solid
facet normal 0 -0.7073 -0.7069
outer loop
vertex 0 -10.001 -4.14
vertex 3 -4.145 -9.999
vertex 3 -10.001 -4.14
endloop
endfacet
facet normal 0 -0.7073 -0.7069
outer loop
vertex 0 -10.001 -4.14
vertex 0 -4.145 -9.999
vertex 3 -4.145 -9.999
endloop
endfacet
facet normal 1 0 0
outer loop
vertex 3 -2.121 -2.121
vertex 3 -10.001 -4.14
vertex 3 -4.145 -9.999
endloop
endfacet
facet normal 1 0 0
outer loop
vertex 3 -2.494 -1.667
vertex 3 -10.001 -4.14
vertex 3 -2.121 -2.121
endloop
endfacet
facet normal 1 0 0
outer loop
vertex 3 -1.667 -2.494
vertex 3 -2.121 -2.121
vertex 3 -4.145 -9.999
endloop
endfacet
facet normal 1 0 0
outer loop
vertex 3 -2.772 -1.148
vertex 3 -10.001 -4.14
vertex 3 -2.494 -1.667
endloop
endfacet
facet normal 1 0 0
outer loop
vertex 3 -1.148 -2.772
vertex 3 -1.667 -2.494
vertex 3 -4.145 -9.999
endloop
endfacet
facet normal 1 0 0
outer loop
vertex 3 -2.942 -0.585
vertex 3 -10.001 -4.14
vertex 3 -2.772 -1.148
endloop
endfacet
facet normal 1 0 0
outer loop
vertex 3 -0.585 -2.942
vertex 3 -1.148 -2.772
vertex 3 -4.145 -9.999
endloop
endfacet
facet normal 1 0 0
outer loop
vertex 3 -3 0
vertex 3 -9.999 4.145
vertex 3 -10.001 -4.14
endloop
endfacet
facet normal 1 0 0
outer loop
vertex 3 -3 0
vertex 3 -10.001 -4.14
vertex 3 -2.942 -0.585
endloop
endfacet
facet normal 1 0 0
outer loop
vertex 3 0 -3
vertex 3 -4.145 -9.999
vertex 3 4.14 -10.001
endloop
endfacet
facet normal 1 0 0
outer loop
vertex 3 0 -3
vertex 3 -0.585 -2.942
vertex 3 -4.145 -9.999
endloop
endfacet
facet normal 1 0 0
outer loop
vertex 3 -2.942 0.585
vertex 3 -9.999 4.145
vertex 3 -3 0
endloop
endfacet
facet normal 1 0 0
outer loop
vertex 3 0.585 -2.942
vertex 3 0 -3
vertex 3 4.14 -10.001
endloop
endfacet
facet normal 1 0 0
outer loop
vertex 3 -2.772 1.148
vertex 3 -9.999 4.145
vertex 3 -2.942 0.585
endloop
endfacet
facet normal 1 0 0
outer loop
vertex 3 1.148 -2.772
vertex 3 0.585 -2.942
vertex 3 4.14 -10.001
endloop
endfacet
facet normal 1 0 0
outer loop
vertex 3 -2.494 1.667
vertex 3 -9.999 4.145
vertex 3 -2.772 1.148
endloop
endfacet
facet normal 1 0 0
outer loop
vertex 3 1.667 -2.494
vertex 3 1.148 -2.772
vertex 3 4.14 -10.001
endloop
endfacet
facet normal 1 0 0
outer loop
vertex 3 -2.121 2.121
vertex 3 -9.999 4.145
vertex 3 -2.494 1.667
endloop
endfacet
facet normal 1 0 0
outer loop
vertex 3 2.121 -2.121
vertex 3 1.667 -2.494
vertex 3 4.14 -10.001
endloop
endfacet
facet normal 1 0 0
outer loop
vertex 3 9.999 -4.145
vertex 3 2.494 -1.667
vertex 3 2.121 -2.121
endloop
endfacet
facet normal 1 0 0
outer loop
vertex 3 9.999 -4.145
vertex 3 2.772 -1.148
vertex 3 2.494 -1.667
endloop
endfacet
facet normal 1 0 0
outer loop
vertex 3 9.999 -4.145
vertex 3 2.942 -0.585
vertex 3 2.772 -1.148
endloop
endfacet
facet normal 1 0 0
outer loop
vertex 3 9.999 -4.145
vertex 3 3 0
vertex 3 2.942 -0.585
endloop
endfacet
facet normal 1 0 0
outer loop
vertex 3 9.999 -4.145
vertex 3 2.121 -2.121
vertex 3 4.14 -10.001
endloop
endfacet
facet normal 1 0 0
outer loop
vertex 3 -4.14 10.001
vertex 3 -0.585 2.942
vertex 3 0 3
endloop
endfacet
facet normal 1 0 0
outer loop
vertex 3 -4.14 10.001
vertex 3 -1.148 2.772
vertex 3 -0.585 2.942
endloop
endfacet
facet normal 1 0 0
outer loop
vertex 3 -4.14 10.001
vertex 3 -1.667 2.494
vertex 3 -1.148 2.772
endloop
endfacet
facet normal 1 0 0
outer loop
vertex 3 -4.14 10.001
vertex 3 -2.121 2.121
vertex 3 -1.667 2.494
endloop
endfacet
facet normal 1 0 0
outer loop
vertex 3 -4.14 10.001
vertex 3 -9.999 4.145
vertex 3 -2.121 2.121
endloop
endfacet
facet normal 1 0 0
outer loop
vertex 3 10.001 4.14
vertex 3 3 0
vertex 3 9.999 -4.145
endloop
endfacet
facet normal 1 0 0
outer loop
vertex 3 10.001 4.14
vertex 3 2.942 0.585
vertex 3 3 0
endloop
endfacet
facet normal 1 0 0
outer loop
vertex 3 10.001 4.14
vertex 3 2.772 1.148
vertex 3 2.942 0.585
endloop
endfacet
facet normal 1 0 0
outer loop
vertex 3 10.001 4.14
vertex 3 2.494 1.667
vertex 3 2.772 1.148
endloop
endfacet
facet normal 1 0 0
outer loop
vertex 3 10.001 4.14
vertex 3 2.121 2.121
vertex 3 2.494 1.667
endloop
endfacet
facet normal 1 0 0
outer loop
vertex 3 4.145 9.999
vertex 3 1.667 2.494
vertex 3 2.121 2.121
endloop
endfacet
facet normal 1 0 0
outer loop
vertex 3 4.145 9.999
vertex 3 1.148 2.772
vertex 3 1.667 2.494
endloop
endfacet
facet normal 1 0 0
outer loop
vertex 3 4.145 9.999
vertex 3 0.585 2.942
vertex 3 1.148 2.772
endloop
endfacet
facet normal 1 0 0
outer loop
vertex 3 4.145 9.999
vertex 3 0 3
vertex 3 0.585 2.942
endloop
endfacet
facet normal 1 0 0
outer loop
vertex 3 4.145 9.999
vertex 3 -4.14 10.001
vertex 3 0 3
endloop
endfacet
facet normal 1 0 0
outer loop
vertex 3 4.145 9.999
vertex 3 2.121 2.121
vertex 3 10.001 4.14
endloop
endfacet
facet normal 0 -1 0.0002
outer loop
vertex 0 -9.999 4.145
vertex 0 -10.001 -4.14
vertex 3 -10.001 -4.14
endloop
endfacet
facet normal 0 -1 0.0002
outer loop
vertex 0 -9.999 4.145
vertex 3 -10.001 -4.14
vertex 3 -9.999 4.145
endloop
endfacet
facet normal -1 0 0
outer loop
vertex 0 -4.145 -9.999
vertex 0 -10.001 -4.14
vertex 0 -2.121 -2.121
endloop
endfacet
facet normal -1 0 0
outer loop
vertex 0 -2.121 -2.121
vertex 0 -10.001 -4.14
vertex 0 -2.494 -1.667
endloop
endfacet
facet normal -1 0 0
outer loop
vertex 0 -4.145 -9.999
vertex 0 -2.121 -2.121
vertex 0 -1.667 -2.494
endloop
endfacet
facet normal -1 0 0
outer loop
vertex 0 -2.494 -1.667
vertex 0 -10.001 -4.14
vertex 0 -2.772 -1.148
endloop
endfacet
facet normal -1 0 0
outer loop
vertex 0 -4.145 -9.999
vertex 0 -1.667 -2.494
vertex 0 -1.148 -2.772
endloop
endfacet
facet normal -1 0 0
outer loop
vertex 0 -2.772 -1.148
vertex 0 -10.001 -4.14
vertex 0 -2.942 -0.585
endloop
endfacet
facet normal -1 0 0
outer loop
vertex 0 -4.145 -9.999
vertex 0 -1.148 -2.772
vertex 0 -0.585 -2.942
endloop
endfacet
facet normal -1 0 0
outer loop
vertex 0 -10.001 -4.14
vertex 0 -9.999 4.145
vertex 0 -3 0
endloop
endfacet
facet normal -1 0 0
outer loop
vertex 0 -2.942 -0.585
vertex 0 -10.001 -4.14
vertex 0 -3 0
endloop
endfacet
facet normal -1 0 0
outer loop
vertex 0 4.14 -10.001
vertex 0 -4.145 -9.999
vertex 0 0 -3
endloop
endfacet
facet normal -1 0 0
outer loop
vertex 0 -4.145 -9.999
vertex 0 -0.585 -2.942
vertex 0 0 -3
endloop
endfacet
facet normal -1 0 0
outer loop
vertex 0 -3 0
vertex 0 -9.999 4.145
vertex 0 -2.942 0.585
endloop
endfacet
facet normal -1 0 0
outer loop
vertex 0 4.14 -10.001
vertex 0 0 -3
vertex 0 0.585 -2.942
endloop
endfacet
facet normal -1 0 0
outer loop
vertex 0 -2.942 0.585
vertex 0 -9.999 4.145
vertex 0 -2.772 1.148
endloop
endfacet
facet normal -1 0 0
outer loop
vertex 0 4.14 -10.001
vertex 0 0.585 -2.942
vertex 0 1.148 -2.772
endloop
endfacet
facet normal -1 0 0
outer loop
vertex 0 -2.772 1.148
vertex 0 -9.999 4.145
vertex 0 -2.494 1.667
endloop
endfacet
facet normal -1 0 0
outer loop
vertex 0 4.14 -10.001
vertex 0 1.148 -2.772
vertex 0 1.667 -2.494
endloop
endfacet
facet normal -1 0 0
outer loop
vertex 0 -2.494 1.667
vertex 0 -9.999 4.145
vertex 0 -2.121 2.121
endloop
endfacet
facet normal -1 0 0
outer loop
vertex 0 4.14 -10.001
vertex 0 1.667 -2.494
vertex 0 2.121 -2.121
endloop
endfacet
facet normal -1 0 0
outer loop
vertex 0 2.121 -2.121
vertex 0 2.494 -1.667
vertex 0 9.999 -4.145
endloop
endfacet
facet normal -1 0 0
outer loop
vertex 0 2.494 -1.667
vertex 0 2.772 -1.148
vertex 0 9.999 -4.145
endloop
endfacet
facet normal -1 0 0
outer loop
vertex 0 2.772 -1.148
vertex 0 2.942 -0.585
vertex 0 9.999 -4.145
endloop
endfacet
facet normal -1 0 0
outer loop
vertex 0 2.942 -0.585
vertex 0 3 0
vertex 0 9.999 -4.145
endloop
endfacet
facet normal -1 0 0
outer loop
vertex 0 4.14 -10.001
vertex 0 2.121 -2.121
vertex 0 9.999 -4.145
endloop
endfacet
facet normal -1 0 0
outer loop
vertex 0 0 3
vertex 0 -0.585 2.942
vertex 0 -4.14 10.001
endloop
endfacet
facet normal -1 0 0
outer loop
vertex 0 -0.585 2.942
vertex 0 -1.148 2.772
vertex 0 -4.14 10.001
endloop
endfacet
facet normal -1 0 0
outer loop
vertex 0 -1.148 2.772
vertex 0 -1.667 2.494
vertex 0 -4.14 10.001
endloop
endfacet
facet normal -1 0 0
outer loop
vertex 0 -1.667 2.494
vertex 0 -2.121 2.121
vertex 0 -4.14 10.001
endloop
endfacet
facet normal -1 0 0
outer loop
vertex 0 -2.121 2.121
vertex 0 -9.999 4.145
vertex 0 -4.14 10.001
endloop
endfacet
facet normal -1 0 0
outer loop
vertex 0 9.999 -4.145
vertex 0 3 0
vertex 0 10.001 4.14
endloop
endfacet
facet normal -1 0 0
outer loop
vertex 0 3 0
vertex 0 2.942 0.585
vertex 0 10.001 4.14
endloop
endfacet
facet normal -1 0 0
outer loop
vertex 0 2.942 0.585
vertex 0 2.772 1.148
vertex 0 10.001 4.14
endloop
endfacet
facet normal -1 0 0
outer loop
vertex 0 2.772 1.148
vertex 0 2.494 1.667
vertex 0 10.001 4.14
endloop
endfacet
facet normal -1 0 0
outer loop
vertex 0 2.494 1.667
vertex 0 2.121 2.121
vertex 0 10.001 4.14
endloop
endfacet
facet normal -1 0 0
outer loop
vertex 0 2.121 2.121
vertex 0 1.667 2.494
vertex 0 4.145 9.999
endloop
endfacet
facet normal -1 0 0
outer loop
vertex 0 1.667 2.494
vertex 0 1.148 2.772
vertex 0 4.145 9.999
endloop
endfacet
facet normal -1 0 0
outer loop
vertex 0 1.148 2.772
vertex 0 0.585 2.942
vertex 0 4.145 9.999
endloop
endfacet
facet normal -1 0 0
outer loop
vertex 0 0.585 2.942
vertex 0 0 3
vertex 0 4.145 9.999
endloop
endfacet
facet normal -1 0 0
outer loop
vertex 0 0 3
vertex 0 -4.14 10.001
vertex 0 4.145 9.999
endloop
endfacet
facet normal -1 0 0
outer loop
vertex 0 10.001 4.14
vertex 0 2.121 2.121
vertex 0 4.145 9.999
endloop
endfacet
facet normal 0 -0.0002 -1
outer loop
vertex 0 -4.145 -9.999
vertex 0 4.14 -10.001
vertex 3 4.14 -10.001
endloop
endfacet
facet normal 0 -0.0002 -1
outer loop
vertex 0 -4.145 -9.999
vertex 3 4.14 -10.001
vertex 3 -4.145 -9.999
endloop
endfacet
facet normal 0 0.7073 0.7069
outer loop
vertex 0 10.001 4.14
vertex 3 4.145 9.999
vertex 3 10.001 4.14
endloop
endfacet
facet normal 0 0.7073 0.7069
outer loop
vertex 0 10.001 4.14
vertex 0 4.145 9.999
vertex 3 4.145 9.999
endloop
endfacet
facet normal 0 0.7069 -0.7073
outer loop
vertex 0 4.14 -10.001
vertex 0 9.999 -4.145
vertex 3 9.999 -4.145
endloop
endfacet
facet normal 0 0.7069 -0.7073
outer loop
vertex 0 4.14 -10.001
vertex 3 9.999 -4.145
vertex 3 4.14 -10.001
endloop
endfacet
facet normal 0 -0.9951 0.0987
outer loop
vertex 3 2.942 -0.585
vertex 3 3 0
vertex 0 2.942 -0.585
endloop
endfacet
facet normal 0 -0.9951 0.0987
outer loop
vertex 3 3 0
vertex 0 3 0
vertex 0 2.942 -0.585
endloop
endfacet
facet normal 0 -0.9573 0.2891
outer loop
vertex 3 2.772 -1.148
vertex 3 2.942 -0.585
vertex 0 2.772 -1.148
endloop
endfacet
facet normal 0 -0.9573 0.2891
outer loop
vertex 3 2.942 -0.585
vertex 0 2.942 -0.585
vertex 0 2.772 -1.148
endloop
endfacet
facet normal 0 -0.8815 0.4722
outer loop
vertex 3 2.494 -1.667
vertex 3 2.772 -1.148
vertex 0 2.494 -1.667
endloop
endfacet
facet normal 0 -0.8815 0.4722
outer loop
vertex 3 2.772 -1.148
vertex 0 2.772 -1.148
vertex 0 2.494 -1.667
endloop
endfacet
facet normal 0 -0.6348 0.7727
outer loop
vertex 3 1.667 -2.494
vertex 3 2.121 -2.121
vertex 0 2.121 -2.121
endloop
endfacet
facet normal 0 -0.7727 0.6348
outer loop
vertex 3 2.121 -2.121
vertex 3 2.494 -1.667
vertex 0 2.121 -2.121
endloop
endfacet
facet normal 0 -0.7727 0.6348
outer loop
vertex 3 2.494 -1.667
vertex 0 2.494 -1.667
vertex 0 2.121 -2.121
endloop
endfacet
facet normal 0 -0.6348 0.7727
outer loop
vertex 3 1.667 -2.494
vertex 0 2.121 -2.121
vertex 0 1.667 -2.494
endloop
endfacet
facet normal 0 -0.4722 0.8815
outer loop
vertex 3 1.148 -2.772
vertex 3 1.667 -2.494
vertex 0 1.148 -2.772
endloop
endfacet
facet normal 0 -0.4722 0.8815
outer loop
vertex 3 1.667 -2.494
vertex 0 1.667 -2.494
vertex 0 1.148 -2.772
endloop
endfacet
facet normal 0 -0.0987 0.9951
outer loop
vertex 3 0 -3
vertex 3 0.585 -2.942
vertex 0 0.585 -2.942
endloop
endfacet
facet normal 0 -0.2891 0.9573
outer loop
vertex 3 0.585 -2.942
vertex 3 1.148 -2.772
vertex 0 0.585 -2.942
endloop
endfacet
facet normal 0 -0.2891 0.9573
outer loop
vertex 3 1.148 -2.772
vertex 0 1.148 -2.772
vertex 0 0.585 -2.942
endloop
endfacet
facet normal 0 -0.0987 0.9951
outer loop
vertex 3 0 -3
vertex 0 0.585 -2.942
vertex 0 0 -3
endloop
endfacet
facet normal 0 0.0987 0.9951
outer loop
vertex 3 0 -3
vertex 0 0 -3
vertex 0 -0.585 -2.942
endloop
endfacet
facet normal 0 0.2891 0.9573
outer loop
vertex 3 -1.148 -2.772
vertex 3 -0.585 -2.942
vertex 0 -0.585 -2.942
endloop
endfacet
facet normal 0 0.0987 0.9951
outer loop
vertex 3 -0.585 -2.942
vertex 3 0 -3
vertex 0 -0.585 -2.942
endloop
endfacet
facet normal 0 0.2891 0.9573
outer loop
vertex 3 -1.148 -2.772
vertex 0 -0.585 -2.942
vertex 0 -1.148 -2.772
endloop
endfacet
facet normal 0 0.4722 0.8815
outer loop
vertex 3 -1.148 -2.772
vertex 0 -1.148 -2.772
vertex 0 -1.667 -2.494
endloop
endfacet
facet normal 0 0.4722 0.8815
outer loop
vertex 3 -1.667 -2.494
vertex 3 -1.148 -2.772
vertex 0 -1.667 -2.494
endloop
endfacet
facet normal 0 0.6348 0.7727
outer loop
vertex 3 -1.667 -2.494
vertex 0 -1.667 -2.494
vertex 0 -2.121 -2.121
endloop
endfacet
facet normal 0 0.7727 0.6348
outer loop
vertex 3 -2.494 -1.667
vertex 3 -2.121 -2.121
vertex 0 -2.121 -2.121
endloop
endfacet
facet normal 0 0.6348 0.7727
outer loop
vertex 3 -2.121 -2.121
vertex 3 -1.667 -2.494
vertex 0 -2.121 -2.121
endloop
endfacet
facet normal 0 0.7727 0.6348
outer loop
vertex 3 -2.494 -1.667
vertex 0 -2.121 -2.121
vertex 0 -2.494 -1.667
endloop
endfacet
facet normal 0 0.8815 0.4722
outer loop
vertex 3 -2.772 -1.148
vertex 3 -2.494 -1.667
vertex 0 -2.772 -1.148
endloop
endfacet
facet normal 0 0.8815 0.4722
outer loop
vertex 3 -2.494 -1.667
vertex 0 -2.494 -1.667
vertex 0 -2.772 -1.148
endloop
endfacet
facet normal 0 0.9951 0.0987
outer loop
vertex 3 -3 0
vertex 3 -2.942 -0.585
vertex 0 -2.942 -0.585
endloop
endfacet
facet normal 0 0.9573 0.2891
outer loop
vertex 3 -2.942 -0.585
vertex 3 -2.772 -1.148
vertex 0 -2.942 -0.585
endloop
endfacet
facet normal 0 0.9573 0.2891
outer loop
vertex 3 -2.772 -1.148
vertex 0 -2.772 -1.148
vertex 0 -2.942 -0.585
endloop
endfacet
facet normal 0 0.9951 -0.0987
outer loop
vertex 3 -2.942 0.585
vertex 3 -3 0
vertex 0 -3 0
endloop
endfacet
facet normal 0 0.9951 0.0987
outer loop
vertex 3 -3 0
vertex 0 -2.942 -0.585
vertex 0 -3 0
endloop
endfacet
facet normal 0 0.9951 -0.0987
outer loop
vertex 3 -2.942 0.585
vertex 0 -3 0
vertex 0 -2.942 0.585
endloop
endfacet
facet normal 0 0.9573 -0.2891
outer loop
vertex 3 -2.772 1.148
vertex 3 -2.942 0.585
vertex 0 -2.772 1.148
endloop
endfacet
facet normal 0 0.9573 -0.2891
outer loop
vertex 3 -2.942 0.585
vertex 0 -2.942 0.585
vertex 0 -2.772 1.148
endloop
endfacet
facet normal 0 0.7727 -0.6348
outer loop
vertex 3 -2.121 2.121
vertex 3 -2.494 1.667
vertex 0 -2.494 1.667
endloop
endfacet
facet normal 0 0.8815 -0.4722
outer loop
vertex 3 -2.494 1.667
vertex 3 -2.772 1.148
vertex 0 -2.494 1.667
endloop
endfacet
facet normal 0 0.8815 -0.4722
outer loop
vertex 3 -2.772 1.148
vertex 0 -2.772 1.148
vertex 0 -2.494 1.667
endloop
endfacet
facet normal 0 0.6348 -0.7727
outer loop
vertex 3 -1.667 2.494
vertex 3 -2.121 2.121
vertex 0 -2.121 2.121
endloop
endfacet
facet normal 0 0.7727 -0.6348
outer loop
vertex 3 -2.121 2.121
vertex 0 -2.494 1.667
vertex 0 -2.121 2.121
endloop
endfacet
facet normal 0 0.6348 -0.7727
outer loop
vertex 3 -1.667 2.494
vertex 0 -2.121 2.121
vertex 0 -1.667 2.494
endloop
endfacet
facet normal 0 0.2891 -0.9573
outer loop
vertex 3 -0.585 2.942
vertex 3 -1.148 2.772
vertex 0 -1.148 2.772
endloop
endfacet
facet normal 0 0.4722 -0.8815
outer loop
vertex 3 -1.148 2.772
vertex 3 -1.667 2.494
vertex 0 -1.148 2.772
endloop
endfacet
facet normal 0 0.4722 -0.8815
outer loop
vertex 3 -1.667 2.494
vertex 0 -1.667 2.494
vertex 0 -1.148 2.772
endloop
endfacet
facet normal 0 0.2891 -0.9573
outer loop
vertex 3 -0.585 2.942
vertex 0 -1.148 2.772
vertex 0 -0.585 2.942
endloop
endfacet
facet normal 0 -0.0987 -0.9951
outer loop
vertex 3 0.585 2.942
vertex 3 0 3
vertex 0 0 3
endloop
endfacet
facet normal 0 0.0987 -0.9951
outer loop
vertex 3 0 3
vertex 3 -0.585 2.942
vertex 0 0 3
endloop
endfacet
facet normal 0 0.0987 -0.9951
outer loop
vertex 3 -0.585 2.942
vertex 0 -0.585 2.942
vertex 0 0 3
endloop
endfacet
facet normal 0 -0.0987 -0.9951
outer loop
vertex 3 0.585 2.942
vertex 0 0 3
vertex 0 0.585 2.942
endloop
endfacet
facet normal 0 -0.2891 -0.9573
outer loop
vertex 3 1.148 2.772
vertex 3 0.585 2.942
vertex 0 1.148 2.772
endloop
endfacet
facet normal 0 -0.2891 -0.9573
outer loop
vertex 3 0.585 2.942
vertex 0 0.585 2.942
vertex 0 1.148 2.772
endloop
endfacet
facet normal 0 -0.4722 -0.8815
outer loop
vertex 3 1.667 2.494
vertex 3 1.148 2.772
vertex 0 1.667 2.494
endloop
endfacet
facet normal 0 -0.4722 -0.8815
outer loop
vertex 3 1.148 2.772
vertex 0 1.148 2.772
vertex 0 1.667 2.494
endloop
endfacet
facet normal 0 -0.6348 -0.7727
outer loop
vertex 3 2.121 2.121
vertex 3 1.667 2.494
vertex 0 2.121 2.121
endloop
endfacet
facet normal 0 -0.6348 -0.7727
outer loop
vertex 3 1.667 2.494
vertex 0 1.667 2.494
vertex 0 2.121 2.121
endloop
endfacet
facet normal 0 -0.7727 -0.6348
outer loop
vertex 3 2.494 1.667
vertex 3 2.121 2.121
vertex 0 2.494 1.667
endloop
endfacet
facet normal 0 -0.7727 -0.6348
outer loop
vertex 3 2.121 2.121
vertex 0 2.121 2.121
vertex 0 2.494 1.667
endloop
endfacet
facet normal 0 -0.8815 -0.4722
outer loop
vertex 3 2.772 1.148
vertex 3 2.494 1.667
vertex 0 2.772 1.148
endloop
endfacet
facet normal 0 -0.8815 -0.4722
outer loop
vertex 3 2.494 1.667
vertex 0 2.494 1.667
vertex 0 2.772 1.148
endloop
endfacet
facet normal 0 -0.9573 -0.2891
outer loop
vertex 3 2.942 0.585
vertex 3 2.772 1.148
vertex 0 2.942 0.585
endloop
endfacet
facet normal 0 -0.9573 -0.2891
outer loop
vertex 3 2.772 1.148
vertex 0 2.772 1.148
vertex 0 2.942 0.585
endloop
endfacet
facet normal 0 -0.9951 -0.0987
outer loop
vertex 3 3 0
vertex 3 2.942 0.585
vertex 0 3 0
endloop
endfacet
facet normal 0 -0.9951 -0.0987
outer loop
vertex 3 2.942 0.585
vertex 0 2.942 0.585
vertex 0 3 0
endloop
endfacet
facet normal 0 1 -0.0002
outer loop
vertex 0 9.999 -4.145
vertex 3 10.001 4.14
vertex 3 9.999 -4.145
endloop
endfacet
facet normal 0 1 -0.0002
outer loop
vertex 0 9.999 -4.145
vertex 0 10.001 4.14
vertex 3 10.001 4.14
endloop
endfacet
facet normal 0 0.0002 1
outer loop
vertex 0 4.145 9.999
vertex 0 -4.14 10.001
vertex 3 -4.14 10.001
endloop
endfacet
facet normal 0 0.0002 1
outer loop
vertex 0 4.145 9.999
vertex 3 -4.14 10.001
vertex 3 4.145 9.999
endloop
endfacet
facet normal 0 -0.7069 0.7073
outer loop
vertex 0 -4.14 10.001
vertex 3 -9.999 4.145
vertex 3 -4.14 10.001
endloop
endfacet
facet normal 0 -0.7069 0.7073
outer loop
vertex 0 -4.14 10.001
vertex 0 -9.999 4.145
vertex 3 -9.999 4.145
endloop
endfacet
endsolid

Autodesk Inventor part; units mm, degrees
ref_plane "YZ Plane" through (0, 0, 0) normal (1, 0, 0) x (0, 1, 0)
ref_plane "XZ Plane" through (0, 0, 0) normal (0, 1, 0) x (-1, 0, 0)
ref_plane "XY Plane" through (0, 0, 0) normal (0, 0, 1) x (1, 0, 0)
sketch "Sketch1" plane through (0, 0, 0) normal (1, 0, 0) x (0, 1, 0)
  line L0 (-4.1396, 10.001) -> (4.1446, 9.999)
  line L1 (4.1446, 9.999) -> (10.001, 4.1396)
  line L2 (10.001, 4.1396) -> (9.999, -4.1446)
  line L3 (9.999, -4.1446) -> (4.1396, -10.001)
  line L4 (4.1396, -10.001) -> (-4.1446, -9.999)
  line L5 (-4.1446, -9.999) -> (-10.001, -4.1396)
  line L6 (-10.001, -4.1396) -> (-9.999, 4.1446)
  line L7 (-9.999, 4.1446) -> (-4.1396, 10.001)
  circle A0 centre (0, 0) radius 3
  dimension "d0" = 10
  dimension "d1" = 6
extrude "Extrusion1" add sketch "Sketch1" along normal blind 3
properties part number "Nuy"
